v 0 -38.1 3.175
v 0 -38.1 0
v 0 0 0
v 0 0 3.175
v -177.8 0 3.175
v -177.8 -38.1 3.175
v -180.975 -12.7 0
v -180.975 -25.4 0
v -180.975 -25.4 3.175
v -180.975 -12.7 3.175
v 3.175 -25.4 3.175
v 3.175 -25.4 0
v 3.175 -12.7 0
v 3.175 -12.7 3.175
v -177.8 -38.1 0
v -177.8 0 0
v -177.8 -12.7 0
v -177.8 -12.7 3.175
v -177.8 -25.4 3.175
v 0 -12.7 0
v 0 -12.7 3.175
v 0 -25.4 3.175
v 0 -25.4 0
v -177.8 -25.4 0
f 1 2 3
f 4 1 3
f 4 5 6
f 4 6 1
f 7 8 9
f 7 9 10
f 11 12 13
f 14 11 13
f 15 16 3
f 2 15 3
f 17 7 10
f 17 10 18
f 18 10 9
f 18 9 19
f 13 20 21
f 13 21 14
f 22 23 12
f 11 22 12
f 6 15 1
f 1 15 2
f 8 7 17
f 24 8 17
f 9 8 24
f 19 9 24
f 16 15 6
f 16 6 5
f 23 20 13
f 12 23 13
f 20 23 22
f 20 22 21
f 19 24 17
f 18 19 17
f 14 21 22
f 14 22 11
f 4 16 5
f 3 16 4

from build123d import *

# Parameters (mm, degrees)
F0_W     = 177.8
F0_H     = 38.1
F3_DEPTH = 3.175
F1_W     = 3.175
F1_H     = 12.7
F2_W     = 3.175
F2_H     = 12.7


with BuildPart() as f3:
    # F0 (on Top) → F3 (new body)
    with BuildSketch(Plane.XY):
        with Locations((-88.9, -19.05)):
            Rectangle(F0_W, F0_H)
    extrude(amount=F3_DEPTH)


with BuildPart() as f3b:
    # F1 (on face) → F3, piece 2 (new body)
    with BuildSketch(Plane.XY):
        with Locations((1.5875, -19.05)):
            Rectangle(F1_W, F1_H)
    extrude(amount=F3_DEPTH)


with BuildPart() as f3c:
    # F2 (on face) → F3, piece 3 (new body)
    with BuildSketch(Plane.XY):
        with Locations((-179.3875, -19.05)):
            Rectangle(F2_W, F2_H)
    extrude(amount=F3_DEPTH)


solid = Compound([f3.part, f3b.part, f3c.part])
